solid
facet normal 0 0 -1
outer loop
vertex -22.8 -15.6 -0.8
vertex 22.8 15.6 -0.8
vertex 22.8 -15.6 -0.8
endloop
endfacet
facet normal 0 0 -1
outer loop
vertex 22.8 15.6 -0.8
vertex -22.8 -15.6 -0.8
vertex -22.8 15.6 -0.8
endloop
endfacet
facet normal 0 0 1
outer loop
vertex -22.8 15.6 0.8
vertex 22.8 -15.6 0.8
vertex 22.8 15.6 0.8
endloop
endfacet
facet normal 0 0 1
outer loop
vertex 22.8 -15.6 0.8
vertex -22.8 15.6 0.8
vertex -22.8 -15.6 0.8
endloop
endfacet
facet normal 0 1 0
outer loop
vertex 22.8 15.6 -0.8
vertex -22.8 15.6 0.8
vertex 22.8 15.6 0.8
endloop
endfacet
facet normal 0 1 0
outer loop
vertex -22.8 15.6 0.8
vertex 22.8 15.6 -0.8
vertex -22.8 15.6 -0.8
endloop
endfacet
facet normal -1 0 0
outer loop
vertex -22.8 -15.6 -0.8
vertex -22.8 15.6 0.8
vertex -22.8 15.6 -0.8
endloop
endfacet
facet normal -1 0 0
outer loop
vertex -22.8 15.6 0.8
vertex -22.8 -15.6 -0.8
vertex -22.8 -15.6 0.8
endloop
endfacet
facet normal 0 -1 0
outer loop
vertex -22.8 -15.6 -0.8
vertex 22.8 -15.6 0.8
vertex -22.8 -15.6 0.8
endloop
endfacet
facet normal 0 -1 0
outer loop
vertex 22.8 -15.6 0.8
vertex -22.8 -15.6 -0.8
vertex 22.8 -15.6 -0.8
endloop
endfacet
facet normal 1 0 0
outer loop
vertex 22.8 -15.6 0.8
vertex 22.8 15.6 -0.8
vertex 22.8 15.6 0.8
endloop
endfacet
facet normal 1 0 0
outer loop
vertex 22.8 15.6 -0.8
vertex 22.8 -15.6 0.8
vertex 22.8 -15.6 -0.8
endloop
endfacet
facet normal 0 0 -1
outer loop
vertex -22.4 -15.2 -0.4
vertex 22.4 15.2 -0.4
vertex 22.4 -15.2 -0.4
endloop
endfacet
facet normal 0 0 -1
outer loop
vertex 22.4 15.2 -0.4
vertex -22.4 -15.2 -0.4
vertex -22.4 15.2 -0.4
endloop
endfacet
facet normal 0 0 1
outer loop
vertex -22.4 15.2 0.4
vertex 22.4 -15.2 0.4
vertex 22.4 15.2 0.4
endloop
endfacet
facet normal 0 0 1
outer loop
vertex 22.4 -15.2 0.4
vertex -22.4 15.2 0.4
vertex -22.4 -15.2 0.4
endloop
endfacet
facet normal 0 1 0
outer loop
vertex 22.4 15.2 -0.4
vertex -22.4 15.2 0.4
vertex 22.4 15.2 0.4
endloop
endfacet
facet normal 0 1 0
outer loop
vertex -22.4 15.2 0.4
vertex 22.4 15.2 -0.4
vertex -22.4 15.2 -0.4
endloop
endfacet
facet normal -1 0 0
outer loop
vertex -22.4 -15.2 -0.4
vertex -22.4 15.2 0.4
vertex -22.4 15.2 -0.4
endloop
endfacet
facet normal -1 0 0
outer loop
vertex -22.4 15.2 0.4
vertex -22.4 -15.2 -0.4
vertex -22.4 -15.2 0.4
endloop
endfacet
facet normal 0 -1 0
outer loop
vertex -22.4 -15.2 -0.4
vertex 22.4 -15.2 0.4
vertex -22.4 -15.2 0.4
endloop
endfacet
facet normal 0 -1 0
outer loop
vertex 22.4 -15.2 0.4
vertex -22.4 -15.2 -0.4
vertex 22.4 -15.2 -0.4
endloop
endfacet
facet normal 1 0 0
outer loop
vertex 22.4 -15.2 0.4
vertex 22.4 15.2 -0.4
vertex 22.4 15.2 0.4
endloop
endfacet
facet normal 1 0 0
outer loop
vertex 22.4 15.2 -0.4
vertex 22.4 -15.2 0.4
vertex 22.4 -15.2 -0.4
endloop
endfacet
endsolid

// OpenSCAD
// file: ../p/box.scad
use <../lib.scad>
function ldraw_lib__box() = [
// 0 Box 6 (six faces)
// 0 Name: box.dat
// 0 Author: James Jessiman
// 0 !LDRAW_ORG Primitive UPDATE 2002-05
// 0 !LICENSE Licensed under CC BY 4.0 : see CAreadme.txt
// 
// 0 BFC CERTIFY CCW
  [0,"BFC","CERTIFY"],
  [0,"BFC","CCW"],
// 
// 0 !HISTORY 2002-08-22 [sbliss] Applied BFC
// 0 !HISTORY 2002-11-30 [PTadmin] Official Update 2002-05
// 0 !HISTORY 2007-06-24 [PTadmin] Header formatted for Contributor Agreement
// 0 !HISTORY 2008-07-01 [PTadmin] Official Update 2008-01
// 
// 
// 2 24 1 1 1 -1 1 1
  [2,24,1,1,1,-1,1,1],
// 2 24 -1 1 1 -1 1 -1
  [2,24,-1,1,1,-1,1,-1],
// 2 24 -1 1 -1 1 1 -1
  [2,24,-1,1,-1,1,1,-1],
// 2 24 1 1 -1 1 1 1
  [2,24,1,1,-1,1,1,1],
// 2 24 1 -1 1 -1 -1 1
  [2,24,1,-1,1,-1,-1,1],
// 2 24 -1 -1 1 -1 -1 -1
  [2,24,-1,-1,1,-1,-1,-1],
// 2 24 -1 -1 -1 1 -1 -1
  [2,24,-1,-1,-1,1,-1,-1],
// 2 24 1 -1 -1 1 -1 1
  [2,24,1,-1,-1,1,-1,1],
// 2 24 1 -1 1 1 1 1
  [2,24,1,-1,1,1,1,1],
// 2 24 -1 -1 1 -1 1 1
  [2,24,-1,-1,1,-1,1,1],
// 2 24 1 -1 -1 1 1 -1
  [2,24,1,-1,-1,1,1,-1],
// 2 24 -1 -1 -1 -1 1 -1
  [2,24,-1,-1,-1,-1,1,-1],
// 4 16 1 1 1 1 1 -1 -1 1 -1 -1 1 1
  [4,16,1,1,1,1,1,-1,-1,1,-1,-1,1,1],
// 4 16 -1 -1 -1 1 -1 -1 1 -1 1 -1 -1 1
  [4,16,-1,-1,-1,1,-1,-1,1,-1,1,-1,-1,1],
// 4 16 -1 -1 1 1 -1 1 1 1 1 -1 1 1
  [4,16,-1,-1,1,1,-1,1,1,1,1,-1,1,1],
// 4 16 -1 -1 -1 -1 -1 1 -1 1 1 -1 1 -1
  [4,16,-1,-1,-1,-1,-1,1,-1,1,1,-1,1,-1],
// 4 16 1 -1 -1 -1 -1 -1 -1 1 -1 1 1 -1
  [4,16,1,-1,-1,-1,-1,-1,-1,1,-1,1,1,-1],
// 4 16 1 -1 1 1 -1 -1 1 1 -1 1 1 1
  [4,16,1,-1,1,1,-1,-1,1,1,-1,1,1,1],
// 0
];
module ldraw_lib__box(step=0, col=false, unit=2/5, alt=false, line=0.2, solid=!$preview)
    makepoly(ldraw_lib__box(), step=step, col=col, unit=unit, alt=alt, line=line, solid=solid);
ldraw_lib__box(line=0.2);
// main file
use <../lib.scad>
use <../p/box.scad>
function ldraw_lib__89655() = [
// 0 ~Electric Energy Display Screen
// 0 Name: 89655.dat
// 0 Author: Philippe Hurbain [Philo]
// 0 !LDRAW_ORG Part UPDATE 2018-02
// 0 !LICENSE Licensed under CC BY 4.0 : see CAreadme.txt
// 
// 0 BFC CERTIFY CCW
  [0,"BFC","CERTIFY"],
  [0,"BFC","CCW"],
// 
// 0 !HISTORY 2018-12-08 [PTadmin] Official Update 2018-02
// 
// 
// 1 16 0 0 0 57 0 0 0 2 0 0 0 39 box.dat
  [1,16,0,0,0,57,0,0,0,2,0,0,0,39, ldraw_lib__box()],
// 1 120 0 0 0 56 0 0 0 1 0 0 0 38 box.dat
  [1,120,0,0,0,56,0,0,0,1,0,0,0,38, ldraw_lib__box()],
];
module ldraw_lib__89655(step=0, col=false, unit=2/5, alt=false, line=0.2, solid=!$preview)
    makepoly(ldraw_lib__89655(), step=step, col=col, unit=unit, alt=alt, line=line, solid=solid);
ldraw_lib__89655(line=0.2);
